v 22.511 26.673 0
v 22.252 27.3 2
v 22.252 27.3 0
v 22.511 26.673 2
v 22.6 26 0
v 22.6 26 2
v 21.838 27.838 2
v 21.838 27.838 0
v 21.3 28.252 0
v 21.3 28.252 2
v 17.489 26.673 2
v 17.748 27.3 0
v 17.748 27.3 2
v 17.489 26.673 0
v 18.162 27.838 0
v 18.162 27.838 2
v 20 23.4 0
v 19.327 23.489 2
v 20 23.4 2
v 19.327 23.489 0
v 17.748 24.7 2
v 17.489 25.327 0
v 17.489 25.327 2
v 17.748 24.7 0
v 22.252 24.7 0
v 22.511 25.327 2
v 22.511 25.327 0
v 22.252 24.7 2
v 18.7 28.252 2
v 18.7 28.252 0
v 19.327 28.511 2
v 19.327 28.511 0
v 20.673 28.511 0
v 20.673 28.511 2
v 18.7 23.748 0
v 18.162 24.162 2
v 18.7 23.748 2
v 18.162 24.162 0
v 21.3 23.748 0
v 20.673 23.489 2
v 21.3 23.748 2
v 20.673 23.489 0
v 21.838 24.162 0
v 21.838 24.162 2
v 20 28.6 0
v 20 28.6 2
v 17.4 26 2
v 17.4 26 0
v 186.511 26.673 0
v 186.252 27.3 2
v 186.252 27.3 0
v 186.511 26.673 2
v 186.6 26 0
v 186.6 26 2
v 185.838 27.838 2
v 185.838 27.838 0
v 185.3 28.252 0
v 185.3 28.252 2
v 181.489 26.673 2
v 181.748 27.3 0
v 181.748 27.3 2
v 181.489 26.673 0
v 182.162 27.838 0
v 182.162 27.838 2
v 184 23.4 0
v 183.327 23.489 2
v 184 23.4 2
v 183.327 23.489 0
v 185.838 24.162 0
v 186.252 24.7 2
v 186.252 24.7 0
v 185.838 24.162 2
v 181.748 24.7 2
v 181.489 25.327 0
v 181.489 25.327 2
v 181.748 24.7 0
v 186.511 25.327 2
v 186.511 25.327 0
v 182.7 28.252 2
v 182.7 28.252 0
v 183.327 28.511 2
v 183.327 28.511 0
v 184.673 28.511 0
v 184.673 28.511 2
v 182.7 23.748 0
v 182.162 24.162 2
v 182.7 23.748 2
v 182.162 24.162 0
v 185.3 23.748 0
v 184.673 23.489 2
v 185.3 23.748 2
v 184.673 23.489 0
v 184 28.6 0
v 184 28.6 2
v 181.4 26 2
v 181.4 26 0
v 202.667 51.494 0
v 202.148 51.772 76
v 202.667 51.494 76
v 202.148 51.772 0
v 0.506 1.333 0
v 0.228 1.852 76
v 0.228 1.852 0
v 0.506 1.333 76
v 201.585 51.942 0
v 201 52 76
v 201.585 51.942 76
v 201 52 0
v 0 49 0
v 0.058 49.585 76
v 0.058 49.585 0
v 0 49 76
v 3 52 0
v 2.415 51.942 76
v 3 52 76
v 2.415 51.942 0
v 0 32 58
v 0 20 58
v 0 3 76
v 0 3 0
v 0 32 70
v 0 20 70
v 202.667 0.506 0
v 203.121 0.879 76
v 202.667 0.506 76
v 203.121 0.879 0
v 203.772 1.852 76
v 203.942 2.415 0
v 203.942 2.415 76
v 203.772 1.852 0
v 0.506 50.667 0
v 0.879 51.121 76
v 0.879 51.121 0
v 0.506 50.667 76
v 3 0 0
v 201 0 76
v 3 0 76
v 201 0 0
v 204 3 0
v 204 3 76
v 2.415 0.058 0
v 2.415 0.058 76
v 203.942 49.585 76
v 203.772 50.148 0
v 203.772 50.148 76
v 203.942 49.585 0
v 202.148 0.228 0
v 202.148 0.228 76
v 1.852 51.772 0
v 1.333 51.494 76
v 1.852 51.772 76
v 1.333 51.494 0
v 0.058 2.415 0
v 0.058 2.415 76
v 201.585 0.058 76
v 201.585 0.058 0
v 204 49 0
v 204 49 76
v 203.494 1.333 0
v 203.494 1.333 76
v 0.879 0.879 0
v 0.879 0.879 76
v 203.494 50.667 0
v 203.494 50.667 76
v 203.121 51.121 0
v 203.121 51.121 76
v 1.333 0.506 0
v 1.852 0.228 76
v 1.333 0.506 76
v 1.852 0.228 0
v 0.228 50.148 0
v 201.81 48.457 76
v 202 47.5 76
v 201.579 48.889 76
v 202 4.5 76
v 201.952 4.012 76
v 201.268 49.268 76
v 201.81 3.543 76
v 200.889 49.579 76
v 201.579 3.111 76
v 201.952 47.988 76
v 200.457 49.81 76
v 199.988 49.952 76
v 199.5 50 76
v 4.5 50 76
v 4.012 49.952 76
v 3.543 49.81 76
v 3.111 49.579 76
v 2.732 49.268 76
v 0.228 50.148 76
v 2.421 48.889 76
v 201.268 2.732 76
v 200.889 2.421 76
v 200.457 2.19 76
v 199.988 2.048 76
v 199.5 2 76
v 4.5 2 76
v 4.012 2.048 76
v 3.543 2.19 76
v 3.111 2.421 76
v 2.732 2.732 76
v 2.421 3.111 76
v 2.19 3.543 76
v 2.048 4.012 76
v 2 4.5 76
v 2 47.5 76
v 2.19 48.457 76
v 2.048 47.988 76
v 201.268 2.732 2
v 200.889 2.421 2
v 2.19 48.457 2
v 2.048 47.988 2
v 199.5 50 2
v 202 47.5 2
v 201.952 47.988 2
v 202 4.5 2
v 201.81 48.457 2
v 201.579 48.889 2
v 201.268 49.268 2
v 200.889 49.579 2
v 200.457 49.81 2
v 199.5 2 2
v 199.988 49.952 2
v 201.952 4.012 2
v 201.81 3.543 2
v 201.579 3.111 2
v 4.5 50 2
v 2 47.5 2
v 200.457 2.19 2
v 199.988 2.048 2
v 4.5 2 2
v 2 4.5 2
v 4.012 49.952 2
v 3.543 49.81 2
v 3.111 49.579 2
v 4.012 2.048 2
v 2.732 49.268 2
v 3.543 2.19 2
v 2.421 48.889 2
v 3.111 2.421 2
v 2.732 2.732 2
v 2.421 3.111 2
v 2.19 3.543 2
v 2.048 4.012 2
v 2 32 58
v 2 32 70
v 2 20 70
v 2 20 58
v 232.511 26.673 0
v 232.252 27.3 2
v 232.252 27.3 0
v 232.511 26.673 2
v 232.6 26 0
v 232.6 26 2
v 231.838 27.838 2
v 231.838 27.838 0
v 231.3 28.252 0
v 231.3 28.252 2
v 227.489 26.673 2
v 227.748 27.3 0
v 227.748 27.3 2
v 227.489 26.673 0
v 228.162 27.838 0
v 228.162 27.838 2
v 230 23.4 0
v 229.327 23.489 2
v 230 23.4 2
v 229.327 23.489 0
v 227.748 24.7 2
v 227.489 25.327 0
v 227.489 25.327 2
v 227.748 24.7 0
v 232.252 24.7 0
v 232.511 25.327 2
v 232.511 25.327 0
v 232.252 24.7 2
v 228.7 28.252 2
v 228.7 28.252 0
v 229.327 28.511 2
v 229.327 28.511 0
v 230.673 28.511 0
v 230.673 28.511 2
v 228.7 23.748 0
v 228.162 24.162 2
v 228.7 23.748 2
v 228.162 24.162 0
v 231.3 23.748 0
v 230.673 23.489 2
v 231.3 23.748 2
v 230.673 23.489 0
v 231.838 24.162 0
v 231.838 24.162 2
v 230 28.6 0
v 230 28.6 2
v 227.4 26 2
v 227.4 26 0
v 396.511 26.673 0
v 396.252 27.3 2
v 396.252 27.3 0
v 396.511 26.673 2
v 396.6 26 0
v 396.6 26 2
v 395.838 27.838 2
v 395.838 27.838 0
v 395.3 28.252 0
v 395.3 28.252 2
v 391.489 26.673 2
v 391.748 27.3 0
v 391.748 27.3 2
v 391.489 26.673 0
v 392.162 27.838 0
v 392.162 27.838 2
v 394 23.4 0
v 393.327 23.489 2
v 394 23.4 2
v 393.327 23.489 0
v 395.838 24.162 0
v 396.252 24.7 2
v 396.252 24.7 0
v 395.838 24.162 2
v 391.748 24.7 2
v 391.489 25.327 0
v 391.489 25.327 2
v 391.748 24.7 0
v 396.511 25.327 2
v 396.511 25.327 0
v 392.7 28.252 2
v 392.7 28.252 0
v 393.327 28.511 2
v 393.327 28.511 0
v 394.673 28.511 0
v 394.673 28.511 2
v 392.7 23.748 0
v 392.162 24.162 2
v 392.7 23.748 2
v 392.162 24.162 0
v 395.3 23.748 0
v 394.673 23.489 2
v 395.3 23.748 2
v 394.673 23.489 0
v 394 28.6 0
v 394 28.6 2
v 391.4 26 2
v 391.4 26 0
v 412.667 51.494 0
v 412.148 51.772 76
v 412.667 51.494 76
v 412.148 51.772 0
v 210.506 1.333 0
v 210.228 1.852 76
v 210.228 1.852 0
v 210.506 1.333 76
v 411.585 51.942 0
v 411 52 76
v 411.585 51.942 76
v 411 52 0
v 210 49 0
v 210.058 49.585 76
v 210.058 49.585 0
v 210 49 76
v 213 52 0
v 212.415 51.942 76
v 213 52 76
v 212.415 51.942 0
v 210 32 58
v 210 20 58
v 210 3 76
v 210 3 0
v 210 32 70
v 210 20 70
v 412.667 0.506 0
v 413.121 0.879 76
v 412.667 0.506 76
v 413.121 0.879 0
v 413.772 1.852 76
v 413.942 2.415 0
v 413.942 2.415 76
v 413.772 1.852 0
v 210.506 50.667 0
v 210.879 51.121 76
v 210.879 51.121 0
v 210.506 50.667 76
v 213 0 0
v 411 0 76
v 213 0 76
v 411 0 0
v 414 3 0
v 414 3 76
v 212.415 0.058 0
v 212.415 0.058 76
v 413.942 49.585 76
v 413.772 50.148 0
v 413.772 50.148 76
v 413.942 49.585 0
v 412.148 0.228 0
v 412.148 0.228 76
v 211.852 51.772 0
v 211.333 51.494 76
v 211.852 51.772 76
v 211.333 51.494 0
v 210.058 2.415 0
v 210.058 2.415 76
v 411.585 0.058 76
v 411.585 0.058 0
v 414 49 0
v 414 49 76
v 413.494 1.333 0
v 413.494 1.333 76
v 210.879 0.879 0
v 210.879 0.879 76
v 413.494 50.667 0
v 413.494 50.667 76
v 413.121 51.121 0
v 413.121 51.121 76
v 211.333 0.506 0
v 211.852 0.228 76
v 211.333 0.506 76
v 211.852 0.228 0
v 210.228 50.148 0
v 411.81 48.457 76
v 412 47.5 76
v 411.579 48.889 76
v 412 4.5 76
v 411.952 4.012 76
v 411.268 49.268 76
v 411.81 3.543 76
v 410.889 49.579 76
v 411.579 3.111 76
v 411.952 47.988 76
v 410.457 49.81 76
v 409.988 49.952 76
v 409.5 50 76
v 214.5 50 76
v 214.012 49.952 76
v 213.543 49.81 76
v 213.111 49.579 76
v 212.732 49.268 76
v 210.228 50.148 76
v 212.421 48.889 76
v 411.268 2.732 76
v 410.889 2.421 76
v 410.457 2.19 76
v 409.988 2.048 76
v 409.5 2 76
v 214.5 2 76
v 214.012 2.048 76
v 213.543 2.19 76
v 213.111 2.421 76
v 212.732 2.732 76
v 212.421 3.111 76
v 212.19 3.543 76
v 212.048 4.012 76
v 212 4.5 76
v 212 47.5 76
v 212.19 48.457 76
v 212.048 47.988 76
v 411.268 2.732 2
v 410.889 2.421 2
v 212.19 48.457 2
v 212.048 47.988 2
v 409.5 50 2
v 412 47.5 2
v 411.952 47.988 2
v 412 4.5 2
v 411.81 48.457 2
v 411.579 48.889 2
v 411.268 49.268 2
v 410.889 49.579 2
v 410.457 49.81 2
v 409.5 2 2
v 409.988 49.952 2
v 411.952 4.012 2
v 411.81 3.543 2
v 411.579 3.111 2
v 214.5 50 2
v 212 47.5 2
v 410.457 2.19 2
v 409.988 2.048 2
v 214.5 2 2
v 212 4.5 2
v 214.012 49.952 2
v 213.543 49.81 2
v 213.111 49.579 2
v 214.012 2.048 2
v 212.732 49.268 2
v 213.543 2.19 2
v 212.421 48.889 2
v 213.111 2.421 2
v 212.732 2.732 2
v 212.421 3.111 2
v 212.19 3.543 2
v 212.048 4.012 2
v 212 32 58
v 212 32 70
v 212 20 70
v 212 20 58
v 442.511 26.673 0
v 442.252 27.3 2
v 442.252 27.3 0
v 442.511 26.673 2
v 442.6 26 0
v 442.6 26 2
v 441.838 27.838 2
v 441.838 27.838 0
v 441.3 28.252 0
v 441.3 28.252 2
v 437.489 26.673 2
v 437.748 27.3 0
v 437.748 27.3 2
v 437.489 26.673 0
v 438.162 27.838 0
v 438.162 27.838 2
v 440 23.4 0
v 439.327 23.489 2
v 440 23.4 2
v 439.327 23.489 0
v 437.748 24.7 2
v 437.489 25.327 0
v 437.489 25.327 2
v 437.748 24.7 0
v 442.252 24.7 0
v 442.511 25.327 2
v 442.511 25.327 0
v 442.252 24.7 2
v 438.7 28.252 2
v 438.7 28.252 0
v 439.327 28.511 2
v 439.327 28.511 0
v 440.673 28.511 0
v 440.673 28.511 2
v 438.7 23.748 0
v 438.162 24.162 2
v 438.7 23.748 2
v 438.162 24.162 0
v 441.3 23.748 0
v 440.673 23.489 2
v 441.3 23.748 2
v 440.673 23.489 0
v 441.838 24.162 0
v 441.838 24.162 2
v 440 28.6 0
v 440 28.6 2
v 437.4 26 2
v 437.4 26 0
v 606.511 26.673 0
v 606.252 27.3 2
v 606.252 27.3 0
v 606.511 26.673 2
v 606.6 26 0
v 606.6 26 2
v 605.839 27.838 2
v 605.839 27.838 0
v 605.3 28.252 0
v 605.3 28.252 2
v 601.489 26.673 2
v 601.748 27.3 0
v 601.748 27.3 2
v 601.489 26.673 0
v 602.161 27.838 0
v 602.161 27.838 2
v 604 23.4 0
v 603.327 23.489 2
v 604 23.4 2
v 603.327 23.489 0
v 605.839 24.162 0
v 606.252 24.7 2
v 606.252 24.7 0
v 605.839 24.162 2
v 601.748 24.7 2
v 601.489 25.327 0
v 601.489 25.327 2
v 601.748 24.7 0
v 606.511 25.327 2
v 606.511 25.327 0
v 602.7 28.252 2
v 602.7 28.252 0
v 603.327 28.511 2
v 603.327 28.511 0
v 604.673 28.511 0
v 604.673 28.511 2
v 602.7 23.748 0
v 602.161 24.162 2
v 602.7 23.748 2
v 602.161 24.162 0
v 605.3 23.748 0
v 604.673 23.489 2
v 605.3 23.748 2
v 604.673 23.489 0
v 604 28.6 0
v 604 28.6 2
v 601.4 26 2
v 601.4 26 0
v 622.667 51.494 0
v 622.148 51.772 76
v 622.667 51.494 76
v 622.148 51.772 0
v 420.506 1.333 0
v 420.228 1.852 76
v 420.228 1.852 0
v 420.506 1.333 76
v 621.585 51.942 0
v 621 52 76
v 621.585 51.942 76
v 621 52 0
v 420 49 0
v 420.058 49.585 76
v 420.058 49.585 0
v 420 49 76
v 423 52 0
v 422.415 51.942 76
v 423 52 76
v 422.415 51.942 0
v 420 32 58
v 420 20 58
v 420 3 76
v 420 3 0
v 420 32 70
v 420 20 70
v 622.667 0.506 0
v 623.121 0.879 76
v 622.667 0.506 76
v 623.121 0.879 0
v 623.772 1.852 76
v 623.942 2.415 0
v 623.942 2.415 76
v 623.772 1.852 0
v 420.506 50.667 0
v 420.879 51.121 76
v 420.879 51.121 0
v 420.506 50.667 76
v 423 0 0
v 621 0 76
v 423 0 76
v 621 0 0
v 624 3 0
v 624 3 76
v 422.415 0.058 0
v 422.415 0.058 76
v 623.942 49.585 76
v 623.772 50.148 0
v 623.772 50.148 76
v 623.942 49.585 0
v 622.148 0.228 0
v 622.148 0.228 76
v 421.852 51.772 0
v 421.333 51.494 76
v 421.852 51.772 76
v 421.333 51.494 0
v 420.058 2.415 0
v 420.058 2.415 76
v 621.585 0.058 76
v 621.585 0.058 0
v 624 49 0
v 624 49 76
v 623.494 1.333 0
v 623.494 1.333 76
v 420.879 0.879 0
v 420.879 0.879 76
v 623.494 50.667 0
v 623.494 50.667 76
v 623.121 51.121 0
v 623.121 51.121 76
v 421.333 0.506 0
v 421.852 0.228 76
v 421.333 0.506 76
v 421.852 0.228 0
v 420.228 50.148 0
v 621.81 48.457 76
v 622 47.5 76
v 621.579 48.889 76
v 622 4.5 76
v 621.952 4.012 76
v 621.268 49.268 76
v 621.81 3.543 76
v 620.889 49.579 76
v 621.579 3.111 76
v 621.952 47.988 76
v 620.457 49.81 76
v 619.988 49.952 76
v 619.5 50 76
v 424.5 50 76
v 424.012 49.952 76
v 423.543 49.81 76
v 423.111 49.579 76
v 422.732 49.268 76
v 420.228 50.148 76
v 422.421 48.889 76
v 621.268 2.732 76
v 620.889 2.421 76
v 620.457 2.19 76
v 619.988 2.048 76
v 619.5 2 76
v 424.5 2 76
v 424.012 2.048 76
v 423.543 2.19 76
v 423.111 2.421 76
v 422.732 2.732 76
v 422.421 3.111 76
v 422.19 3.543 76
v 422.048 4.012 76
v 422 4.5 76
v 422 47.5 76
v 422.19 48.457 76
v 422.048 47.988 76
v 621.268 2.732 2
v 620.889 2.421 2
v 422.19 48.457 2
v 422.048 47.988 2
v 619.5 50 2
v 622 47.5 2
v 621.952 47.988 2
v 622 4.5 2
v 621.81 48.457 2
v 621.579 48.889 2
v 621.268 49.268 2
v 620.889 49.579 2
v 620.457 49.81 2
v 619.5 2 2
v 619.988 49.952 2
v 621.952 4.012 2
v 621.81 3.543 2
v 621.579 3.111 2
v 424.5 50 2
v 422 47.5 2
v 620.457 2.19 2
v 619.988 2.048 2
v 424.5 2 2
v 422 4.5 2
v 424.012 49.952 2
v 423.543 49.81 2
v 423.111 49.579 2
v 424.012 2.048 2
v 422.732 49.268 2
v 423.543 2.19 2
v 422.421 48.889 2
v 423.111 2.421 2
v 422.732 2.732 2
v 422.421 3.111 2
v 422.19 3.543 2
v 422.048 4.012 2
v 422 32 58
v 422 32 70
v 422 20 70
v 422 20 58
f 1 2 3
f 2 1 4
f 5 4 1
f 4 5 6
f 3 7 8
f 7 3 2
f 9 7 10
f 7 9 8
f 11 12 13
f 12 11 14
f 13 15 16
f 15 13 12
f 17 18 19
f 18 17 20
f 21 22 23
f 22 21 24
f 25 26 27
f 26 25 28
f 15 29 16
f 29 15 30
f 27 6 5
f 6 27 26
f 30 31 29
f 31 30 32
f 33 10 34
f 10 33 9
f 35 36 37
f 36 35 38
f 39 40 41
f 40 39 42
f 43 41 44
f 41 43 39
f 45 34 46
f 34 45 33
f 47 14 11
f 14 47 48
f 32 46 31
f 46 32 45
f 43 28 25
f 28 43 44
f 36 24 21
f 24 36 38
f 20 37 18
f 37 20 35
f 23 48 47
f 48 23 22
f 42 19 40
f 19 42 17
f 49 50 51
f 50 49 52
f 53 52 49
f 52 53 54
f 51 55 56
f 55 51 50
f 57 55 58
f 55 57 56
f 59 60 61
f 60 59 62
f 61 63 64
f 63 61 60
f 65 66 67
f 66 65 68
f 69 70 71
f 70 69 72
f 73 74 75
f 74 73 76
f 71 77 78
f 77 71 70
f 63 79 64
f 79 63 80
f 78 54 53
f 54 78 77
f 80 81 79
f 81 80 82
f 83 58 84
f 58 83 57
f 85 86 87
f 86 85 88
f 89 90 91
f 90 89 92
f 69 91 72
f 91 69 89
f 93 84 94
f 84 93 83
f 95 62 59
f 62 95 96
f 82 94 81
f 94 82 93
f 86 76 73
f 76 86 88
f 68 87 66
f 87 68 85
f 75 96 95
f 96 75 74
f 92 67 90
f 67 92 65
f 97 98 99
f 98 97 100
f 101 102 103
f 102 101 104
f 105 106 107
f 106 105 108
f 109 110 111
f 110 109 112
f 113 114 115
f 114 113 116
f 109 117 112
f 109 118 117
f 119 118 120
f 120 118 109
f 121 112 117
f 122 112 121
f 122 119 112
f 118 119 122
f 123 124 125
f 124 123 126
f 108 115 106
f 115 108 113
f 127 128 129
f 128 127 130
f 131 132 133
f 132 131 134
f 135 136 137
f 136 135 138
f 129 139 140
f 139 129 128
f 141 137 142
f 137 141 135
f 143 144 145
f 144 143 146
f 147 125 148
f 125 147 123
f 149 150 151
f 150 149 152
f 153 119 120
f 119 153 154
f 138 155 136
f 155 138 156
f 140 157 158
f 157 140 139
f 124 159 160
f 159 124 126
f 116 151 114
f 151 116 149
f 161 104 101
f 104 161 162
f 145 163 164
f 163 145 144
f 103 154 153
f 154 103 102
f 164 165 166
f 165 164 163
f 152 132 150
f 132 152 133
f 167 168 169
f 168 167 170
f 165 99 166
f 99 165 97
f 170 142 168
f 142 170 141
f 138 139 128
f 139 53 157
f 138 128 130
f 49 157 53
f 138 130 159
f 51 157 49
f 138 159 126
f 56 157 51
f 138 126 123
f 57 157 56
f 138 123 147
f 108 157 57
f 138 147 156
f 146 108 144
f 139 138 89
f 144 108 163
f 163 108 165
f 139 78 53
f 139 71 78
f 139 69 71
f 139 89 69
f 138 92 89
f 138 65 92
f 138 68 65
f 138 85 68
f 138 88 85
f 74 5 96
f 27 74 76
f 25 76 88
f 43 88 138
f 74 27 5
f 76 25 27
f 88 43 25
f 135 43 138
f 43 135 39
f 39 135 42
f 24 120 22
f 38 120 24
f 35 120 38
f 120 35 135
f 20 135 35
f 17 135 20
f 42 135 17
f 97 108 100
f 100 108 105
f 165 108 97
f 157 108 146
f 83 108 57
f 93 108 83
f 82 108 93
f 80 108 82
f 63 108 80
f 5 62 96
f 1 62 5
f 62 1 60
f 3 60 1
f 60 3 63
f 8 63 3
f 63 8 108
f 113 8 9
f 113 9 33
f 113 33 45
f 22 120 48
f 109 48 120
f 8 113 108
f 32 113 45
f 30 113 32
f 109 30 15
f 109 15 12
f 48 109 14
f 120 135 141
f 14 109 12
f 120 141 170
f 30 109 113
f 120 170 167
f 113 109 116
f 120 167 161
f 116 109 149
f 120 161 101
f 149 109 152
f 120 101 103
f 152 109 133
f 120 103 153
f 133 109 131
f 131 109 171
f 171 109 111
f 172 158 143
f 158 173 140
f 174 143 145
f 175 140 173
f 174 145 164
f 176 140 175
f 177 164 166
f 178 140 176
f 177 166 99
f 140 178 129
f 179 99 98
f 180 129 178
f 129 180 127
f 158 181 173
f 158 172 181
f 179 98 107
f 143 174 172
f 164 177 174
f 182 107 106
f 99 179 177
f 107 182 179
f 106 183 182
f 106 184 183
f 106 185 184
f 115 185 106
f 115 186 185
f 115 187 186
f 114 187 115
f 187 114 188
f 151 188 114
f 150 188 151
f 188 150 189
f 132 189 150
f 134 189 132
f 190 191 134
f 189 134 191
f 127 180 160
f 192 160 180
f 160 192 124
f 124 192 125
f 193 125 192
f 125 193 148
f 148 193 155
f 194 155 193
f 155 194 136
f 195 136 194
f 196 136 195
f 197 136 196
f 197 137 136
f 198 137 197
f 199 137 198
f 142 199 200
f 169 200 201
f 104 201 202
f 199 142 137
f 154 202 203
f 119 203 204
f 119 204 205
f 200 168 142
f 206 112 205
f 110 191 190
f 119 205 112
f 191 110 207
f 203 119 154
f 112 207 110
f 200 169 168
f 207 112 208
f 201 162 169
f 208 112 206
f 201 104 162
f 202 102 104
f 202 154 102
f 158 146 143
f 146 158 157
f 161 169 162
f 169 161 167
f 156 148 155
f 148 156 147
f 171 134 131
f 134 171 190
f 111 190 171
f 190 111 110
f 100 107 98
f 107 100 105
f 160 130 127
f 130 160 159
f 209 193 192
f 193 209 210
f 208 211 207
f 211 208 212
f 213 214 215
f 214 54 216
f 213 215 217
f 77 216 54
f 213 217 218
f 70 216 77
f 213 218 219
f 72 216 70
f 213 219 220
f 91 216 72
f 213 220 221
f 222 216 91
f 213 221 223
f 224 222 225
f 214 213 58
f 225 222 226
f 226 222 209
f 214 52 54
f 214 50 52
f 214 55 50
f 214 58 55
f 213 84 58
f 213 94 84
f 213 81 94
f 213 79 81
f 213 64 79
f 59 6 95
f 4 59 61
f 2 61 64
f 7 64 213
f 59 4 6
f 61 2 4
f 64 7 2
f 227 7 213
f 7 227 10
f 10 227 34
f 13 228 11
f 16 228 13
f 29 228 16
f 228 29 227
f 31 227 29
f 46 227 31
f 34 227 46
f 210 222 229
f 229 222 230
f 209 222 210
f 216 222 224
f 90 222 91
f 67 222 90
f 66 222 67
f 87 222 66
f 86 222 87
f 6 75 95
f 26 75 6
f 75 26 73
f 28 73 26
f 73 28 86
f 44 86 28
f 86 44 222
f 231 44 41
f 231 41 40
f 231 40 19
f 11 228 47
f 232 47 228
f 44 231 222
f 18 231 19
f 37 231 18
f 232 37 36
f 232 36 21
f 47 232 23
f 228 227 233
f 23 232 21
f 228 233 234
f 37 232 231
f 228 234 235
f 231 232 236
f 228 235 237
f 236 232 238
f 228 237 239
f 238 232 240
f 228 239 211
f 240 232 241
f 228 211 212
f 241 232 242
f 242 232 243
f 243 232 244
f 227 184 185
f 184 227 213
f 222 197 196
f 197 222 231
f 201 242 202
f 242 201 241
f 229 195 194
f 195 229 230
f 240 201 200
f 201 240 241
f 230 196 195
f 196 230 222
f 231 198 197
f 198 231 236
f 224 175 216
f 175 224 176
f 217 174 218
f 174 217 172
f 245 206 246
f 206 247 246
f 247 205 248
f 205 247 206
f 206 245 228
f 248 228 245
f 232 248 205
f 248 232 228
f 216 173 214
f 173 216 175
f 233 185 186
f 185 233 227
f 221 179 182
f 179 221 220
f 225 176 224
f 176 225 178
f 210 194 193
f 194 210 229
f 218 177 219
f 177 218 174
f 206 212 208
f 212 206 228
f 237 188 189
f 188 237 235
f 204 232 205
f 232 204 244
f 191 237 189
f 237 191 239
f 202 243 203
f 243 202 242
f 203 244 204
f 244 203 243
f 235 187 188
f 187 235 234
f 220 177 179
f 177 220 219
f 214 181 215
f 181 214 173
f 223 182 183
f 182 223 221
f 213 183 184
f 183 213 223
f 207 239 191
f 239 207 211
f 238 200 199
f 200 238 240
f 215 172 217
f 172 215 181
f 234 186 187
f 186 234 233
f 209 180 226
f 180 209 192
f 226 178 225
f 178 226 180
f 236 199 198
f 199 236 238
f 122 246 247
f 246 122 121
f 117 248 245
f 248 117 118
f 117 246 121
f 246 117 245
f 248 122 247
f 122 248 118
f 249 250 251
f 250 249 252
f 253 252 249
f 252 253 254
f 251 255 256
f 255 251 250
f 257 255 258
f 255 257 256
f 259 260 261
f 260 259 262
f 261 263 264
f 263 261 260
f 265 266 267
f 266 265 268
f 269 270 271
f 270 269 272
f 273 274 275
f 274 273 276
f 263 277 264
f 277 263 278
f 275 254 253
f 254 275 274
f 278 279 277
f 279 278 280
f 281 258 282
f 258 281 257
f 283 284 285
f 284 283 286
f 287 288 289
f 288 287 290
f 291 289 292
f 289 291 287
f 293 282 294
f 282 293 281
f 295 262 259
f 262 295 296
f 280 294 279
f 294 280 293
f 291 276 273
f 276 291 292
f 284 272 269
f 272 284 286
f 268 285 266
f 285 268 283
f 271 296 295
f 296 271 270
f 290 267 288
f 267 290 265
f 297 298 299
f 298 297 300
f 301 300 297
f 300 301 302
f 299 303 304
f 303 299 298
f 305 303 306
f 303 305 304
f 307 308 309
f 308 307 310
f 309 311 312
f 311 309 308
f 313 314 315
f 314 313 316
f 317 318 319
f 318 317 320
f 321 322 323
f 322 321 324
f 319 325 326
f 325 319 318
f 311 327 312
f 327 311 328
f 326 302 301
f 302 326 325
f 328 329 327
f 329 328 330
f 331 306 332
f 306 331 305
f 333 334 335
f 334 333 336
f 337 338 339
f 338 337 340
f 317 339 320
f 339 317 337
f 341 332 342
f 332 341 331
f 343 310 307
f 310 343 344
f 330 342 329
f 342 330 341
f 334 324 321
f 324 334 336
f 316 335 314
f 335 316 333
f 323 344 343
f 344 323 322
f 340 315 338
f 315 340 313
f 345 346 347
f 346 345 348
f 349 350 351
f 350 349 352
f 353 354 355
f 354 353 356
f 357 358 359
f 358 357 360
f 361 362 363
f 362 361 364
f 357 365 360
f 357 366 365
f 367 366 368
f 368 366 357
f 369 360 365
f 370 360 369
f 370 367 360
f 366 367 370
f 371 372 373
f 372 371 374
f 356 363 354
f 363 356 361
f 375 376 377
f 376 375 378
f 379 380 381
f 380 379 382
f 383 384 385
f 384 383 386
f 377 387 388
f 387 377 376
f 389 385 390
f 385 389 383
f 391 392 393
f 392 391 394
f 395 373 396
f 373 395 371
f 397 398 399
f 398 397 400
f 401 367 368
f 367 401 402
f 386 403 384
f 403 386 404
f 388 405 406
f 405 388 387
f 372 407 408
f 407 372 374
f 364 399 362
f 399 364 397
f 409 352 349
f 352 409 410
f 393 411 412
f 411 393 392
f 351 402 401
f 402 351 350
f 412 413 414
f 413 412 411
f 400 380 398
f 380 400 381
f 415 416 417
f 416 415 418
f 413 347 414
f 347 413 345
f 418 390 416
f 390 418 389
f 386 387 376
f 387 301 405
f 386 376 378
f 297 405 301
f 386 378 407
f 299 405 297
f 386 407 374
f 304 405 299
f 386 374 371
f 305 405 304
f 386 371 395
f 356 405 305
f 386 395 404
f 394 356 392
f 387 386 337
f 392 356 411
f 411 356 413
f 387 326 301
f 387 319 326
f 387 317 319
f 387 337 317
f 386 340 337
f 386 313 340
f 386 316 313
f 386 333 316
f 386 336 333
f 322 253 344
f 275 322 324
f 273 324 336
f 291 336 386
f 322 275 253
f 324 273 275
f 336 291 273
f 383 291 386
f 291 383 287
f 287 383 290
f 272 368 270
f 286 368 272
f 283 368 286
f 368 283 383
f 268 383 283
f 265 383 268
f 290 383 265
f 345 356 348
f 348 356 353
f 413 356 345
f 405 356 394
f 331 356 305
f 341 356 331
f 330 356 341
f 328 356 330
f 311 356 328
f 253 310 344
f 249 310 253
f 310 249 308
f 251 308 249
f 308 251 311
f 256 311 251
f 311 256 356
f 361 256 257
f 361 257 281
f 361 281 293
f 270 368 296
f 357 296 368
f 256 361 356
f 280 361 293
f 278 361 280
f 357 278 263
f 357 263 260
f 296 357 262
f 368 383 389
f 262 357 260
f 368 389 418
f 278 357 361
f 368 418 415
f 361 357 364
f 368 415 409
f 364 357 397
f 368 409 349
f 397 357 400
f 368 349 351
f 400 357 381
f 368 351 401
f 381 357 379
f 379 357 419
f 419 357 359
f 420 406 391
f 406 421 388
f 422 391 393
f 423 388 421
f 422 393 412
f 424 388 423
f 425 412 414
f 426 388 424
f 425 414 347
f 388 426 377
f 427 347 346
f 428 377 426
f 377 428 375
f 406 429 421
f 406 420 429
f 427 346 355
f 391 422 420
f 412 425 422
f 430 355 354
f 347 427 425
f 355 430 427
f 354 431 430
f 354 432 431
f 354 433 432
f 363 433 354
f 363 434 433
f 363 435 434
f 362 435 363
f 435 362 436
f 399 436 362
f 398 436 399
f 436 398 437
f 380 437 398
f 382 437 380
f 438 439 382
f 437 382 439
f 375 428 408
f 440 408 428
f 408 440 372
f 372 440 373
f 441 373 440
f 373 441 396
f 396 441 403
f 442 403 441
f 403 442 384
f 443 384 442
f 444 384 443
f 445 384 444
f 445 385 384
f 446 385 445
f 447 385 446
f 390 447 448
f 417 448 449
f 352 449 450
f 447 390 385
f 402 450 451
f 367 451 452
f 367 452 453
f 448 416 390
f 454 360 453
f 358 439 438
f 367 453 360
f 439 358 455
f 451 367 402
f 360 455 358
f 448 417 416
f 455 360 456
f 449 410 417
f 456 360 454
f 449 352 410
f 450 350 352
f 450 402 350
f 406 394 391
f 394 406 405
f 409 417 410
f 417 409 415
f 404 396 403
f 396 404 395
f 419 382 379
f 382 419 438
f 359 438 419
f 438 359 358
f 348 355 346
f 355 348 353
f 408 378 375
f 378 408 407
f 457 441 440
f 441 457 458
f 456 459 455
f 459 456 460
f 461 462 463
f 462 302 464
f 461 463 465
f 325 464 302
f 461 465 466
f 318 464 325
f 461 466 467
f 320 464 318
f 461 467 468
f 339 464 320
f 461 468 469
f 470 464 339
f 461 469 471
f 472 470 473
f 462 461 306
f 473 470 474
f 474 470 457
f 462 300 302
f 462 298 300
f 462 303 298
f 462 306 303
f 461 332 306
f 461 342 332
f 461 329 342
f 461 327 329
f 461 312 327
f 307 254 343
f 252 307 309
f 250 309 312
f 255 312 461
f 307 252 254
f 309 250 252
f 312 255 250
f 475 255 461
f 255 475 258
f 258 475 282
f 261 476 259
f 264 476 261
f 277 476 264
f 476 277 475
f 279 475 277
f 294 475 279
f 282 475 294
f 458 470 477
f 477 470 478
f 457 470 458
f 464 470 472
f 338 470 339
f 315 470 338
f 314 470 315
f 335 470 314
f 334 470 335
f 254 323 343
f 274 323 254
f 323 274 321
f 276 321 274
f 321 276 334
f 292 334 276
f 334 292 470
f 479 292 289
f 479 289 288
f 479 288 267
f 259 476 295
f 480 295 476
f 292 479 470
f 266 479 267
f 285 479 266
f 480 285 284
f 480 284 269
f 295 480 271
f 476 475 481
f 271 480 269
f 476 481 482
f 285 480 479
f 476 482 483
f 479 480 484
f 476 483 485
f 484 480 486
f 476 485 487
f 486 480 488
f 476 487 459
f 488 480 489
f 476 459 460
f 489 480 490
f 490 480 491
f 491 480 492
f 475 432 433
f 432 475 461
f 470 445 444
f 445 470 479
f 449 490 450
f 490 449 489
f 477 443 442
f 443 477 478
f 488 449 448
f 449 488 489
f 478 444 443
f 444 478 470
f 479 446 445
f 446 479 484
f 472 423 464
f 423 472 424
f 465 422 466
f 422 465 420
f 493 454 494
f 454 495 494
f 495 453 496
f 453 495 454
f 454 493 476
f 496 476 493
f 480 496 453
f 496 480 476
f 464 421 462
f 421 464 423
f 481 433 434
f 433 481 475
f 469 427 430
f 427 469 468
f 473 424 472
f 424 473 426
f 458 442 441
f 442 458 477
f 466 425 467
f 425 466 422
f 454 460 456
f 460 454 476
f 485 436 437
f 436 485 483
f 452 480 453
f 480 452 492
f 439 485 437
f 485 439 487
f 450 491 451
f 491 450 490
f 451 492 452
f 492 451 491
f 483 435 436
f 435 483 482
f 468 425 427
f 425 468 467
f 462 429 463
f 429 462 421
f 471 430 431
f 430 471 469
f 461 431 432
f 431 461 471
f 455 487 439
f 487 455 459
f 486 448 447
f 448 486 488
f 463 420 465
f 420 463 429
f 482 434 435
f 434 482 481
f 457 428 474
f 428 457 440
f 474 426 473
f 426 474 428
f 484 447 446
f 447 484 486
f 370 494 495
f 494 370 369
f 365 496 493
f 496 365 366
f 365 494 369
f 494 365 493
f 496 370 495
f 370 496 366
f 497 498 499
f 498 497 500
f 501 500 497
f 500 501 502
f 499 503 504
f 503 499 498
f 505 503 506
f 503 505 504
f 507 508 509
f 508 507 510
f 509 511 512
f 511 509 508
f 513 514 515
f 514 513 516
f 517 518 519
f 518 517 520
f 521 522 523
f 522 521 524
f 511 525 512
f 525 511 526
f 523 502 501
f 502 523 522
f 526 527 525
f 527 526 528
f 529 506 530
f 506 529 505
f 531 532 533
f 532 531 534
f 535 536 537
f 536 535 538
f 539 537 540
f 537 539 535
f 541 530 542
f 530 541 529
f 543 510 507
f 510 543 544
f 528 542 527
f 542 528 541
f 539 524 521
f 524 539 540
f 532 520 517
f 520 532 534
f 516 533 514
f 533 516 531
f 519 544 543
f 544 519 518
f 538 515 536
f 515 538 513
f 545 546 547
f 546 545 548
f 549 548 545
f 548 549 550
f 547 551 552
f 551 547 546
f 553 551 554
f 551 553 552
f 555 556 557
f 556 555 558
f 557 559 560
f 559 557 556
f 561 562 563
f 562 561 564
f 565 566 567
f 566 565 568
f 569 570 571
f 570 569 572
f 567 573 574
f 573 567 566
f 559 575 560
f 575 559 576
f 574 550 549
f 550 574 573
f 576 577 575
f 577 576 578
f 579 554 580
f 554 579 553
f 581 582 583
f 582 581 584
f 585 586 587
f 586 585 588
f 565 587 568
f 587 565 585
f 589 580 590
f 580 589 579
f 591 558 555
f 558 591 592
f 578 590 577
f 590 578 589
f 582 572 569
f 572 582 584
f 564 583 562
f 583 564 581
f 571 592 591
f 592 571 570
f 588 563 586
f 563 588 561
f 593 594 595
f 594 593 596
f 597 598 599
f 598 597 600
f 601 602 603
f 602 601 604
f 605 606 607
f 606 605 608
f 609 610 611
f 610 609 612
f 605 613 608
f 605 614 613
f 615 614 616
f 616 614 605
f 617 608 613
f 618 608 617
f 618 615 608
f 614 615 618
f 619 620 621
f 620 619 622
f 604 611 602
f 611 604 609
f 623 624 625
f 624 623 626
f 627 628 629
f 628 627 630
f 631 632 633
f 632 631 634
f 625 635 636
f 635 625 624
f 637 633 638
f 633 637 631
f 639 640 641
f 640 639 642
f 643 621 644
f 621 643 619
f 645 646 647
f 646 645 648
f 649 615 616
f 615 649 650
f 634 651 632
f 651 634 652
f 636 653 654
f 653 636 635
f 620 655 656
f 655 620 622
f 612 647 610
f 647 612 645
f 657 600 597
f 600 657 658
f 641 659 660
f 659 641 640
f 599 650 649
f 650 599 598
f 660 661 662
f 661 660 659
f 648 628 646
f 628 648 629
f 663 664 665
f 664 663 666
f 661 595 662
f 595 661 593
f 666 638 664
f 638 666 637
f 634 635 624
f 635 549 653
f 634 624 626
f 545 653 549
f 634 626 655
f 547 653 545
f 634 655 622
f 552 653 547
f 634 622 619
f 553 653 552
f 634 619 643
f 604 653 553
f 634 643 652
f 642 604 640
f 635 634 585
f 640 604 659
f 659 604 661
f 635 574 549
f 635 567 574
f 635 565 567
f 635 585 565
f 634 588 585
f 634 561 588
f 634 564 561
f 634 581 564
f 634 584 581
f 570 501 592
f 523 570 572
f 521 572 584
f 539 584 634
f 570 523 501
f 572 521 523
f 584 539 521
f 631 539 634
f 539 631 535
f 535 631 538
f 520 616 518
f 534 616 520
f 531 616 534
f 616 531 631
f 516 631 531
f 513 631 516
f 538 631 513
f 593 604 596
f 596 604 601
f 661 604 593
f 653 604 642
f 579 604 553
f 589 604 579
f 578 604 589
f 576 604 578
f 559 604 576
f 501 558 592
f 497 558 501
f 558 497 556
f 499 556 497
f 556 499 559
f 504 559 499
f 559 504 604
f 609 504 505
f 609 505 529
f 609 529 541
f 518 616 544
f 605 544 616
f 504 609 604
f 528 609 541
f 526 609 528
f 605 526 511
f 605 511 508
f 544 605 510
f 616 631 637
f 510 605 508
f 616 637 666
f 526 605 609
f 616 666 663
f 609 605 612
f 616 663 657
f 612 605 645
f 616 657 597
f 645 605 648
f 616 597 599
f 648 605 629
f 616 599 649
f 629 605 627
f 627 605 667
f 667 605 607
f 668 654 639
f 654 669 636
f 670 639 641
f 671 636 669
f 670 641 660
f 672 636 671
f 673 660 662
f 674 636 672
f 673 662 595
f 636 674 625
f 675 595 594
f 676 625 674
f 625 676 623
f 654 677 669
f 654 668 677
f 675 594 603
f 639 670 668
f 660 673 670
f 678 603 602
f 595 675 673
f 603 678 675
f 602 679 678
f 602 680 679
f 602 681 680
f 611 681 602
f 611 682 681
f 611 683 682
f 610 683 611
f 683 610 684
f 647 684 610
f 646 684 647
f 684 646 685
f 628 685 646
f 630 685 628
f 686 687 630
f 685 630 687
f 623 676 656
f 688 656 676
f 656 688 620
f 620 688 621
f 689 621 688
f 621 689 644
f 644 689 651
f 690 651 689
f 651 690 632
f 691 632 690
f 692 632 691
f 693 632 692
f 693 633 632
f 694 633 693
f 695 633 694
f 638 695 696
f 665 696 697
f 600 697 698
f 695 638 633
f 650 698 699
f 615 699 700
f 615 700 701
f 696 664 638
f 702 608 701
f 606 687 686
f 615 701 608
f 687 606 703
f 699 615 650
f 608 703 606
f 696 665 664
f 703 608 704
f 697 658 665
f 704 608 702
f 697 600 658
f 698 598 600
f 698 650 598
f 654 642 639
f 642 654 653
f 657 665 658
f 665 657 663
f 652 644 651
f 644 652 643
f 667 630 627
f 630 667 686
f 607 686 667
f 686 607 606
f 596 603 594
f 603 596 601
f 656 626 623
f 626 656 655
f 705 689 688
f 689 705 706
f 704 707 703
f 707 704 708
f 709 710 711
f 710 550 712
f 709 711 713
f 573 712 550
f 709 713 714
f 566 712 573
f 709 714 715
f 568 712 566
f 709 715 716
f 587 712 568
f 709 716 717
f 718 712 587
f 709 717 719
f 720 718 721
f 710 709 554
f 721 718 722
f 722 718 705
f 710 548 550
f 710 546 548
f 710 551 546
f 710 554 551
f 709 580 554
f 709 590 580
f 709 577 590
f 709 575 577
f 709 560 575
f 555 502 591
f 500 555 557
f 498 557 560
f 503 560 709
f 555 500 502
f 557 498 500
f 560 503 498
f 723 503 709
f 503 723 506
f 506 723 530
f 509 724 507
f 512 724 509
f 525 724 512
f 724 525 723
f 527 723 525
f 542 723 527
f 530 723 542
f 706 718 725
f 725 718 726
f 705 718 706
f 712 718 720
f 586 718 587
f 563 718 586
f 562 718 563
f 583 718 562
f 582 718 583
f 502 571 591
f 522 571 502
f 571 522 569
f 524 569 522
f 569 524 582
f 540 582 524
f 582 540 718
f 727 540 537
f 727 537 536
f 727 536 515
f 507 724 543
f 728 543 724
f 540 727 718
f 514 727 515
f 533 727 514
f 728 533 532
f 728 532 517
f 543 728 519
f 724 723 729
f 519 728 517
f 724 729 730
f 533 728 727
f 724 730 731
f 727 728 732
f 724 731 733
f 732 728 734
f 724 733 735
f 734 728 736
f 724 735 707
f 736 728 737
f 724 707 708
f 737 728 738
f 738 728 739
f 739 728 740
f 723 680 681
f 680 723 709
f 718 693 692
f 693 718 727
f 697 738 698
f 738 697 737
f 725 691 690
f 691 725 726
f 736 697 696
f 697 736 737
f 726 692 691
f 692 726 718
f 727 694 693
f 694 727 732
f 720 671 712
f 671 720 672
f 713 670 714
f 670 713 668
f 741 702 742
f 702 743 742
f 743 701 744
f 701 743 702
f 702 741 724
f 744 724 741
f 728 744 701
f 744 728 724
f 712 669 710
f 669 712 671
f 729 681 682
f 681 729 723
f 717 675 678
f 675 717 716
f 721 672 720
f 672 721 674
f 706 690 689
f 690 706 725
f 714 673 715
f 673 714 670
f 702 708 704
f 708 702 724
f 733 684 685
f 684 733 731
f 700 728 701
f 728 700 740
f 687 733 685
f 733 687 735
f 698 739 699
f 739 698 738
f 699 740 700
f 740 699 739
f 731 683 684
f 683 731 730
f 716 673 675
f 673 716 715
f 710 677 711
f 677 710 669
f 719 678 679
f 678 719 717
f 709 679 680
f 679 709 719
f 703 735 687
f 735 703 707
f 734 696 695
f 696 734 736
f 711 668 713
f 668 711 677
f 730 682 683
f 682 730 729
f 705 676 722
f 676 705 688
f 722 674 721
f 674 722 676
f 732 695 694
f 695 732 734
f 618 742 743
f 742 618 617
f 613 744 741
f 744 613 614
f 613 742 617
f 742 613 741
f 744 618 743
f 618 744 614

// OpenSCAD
// file: pack-tray.scad
// Perfect Roadster — single 10S2P module tray
// Units: millimeters
// Open in OpenSCAD or any SCAD-compatible tool; also documents dims for fab.

/* [Module / cells] */
cell_d = 18.6;
cell_h = 65.2;
// 10S2P brick footprint (2 parallel × 10 series along length)
brick_l = 10 * cell_d + 8; // ~194 + wrap margin handled below
brick_w = 2 * cell_d + 4;  // ~41.2
brick_h = cell_h + 2;

/* [Tray outer — matches docs/00 envelope] */
tray_l = 204;
tray_w = 52;
tray_h = 76;
wall = 2.0;
corner_r = 3;

/* [Clearance / foam] */
foam = 1.5;

module rounded_box(l, w, h, r) {
  hull() {
    for (x = [r, l - r])
      for (y = [r, w - r])
        translate([x, y, 0])
          cylinder(h = h, r = r, $fn = 32);
  }
}

module tray() {
  difference() {
    rounded_box(tray_l, tray_w, tray_h, corner_r);
    // inner cavity
    translate([wall, wall, wall])
      rounded_box(tray_l - 2 * wall, tray_w - 2 * wall, tray_h - wall + 0.1, corner_r - 0.5);
    // wire exit (BB end)
    translate([-0.1, tray_w / 2 - 6, tray_h - 18])
      cube([wall + 2, 12, 12]);
    // retention bolt holes (M5)
    for (x = [20, tray_l - 20])
      translate([x, tray_w / 2, -0.1])
        cylinder(h = wall + 1, d = 5.2, $fn = 24);
  }
}

module cell_brick_ghost() {
  color([0.2, 0.7, 0.3, 0.35])
    translate([
      (tray_l - brick_l) / 2,
      (tray_w - brick_w) / 2,
      wall + foam
    ])
      cube([brick_l, brick_w, brick_h]);
}

tray();
cell_brick_ghost();

echo("tray_outer_mm", tray_l, tray_w, tray_h);
echo("brick_approx_mm", brick_l, brick_w, brick_h);
echo("inner_clear_mm", tray_l - 2 * wall, tray_w - 2 * wall, tray_h - wall);
// main file
// Perfect Roadster — three module trays stacked along downtube axis
// Units: mm

use <pack-tray.scad>

gap = 6; // lead dress / foam between modules
tray_l = 204;
tray_w = 52;
tray_h = 76;

module stack() {
  for (i = [0:2])
    translate([i * (tray_l + gap), 0, 0])
      tray();
}

stack();

total_l = 3 * tray_l + 2 * gap;
echo("pack_stack_length_mm", total_l); // 624
echo("required_cavity_length_mm", total_l + 16); // ~640 with end clearance
echo("required_cavity_wh_mm", tray_w + 4, tray_h + 4);
